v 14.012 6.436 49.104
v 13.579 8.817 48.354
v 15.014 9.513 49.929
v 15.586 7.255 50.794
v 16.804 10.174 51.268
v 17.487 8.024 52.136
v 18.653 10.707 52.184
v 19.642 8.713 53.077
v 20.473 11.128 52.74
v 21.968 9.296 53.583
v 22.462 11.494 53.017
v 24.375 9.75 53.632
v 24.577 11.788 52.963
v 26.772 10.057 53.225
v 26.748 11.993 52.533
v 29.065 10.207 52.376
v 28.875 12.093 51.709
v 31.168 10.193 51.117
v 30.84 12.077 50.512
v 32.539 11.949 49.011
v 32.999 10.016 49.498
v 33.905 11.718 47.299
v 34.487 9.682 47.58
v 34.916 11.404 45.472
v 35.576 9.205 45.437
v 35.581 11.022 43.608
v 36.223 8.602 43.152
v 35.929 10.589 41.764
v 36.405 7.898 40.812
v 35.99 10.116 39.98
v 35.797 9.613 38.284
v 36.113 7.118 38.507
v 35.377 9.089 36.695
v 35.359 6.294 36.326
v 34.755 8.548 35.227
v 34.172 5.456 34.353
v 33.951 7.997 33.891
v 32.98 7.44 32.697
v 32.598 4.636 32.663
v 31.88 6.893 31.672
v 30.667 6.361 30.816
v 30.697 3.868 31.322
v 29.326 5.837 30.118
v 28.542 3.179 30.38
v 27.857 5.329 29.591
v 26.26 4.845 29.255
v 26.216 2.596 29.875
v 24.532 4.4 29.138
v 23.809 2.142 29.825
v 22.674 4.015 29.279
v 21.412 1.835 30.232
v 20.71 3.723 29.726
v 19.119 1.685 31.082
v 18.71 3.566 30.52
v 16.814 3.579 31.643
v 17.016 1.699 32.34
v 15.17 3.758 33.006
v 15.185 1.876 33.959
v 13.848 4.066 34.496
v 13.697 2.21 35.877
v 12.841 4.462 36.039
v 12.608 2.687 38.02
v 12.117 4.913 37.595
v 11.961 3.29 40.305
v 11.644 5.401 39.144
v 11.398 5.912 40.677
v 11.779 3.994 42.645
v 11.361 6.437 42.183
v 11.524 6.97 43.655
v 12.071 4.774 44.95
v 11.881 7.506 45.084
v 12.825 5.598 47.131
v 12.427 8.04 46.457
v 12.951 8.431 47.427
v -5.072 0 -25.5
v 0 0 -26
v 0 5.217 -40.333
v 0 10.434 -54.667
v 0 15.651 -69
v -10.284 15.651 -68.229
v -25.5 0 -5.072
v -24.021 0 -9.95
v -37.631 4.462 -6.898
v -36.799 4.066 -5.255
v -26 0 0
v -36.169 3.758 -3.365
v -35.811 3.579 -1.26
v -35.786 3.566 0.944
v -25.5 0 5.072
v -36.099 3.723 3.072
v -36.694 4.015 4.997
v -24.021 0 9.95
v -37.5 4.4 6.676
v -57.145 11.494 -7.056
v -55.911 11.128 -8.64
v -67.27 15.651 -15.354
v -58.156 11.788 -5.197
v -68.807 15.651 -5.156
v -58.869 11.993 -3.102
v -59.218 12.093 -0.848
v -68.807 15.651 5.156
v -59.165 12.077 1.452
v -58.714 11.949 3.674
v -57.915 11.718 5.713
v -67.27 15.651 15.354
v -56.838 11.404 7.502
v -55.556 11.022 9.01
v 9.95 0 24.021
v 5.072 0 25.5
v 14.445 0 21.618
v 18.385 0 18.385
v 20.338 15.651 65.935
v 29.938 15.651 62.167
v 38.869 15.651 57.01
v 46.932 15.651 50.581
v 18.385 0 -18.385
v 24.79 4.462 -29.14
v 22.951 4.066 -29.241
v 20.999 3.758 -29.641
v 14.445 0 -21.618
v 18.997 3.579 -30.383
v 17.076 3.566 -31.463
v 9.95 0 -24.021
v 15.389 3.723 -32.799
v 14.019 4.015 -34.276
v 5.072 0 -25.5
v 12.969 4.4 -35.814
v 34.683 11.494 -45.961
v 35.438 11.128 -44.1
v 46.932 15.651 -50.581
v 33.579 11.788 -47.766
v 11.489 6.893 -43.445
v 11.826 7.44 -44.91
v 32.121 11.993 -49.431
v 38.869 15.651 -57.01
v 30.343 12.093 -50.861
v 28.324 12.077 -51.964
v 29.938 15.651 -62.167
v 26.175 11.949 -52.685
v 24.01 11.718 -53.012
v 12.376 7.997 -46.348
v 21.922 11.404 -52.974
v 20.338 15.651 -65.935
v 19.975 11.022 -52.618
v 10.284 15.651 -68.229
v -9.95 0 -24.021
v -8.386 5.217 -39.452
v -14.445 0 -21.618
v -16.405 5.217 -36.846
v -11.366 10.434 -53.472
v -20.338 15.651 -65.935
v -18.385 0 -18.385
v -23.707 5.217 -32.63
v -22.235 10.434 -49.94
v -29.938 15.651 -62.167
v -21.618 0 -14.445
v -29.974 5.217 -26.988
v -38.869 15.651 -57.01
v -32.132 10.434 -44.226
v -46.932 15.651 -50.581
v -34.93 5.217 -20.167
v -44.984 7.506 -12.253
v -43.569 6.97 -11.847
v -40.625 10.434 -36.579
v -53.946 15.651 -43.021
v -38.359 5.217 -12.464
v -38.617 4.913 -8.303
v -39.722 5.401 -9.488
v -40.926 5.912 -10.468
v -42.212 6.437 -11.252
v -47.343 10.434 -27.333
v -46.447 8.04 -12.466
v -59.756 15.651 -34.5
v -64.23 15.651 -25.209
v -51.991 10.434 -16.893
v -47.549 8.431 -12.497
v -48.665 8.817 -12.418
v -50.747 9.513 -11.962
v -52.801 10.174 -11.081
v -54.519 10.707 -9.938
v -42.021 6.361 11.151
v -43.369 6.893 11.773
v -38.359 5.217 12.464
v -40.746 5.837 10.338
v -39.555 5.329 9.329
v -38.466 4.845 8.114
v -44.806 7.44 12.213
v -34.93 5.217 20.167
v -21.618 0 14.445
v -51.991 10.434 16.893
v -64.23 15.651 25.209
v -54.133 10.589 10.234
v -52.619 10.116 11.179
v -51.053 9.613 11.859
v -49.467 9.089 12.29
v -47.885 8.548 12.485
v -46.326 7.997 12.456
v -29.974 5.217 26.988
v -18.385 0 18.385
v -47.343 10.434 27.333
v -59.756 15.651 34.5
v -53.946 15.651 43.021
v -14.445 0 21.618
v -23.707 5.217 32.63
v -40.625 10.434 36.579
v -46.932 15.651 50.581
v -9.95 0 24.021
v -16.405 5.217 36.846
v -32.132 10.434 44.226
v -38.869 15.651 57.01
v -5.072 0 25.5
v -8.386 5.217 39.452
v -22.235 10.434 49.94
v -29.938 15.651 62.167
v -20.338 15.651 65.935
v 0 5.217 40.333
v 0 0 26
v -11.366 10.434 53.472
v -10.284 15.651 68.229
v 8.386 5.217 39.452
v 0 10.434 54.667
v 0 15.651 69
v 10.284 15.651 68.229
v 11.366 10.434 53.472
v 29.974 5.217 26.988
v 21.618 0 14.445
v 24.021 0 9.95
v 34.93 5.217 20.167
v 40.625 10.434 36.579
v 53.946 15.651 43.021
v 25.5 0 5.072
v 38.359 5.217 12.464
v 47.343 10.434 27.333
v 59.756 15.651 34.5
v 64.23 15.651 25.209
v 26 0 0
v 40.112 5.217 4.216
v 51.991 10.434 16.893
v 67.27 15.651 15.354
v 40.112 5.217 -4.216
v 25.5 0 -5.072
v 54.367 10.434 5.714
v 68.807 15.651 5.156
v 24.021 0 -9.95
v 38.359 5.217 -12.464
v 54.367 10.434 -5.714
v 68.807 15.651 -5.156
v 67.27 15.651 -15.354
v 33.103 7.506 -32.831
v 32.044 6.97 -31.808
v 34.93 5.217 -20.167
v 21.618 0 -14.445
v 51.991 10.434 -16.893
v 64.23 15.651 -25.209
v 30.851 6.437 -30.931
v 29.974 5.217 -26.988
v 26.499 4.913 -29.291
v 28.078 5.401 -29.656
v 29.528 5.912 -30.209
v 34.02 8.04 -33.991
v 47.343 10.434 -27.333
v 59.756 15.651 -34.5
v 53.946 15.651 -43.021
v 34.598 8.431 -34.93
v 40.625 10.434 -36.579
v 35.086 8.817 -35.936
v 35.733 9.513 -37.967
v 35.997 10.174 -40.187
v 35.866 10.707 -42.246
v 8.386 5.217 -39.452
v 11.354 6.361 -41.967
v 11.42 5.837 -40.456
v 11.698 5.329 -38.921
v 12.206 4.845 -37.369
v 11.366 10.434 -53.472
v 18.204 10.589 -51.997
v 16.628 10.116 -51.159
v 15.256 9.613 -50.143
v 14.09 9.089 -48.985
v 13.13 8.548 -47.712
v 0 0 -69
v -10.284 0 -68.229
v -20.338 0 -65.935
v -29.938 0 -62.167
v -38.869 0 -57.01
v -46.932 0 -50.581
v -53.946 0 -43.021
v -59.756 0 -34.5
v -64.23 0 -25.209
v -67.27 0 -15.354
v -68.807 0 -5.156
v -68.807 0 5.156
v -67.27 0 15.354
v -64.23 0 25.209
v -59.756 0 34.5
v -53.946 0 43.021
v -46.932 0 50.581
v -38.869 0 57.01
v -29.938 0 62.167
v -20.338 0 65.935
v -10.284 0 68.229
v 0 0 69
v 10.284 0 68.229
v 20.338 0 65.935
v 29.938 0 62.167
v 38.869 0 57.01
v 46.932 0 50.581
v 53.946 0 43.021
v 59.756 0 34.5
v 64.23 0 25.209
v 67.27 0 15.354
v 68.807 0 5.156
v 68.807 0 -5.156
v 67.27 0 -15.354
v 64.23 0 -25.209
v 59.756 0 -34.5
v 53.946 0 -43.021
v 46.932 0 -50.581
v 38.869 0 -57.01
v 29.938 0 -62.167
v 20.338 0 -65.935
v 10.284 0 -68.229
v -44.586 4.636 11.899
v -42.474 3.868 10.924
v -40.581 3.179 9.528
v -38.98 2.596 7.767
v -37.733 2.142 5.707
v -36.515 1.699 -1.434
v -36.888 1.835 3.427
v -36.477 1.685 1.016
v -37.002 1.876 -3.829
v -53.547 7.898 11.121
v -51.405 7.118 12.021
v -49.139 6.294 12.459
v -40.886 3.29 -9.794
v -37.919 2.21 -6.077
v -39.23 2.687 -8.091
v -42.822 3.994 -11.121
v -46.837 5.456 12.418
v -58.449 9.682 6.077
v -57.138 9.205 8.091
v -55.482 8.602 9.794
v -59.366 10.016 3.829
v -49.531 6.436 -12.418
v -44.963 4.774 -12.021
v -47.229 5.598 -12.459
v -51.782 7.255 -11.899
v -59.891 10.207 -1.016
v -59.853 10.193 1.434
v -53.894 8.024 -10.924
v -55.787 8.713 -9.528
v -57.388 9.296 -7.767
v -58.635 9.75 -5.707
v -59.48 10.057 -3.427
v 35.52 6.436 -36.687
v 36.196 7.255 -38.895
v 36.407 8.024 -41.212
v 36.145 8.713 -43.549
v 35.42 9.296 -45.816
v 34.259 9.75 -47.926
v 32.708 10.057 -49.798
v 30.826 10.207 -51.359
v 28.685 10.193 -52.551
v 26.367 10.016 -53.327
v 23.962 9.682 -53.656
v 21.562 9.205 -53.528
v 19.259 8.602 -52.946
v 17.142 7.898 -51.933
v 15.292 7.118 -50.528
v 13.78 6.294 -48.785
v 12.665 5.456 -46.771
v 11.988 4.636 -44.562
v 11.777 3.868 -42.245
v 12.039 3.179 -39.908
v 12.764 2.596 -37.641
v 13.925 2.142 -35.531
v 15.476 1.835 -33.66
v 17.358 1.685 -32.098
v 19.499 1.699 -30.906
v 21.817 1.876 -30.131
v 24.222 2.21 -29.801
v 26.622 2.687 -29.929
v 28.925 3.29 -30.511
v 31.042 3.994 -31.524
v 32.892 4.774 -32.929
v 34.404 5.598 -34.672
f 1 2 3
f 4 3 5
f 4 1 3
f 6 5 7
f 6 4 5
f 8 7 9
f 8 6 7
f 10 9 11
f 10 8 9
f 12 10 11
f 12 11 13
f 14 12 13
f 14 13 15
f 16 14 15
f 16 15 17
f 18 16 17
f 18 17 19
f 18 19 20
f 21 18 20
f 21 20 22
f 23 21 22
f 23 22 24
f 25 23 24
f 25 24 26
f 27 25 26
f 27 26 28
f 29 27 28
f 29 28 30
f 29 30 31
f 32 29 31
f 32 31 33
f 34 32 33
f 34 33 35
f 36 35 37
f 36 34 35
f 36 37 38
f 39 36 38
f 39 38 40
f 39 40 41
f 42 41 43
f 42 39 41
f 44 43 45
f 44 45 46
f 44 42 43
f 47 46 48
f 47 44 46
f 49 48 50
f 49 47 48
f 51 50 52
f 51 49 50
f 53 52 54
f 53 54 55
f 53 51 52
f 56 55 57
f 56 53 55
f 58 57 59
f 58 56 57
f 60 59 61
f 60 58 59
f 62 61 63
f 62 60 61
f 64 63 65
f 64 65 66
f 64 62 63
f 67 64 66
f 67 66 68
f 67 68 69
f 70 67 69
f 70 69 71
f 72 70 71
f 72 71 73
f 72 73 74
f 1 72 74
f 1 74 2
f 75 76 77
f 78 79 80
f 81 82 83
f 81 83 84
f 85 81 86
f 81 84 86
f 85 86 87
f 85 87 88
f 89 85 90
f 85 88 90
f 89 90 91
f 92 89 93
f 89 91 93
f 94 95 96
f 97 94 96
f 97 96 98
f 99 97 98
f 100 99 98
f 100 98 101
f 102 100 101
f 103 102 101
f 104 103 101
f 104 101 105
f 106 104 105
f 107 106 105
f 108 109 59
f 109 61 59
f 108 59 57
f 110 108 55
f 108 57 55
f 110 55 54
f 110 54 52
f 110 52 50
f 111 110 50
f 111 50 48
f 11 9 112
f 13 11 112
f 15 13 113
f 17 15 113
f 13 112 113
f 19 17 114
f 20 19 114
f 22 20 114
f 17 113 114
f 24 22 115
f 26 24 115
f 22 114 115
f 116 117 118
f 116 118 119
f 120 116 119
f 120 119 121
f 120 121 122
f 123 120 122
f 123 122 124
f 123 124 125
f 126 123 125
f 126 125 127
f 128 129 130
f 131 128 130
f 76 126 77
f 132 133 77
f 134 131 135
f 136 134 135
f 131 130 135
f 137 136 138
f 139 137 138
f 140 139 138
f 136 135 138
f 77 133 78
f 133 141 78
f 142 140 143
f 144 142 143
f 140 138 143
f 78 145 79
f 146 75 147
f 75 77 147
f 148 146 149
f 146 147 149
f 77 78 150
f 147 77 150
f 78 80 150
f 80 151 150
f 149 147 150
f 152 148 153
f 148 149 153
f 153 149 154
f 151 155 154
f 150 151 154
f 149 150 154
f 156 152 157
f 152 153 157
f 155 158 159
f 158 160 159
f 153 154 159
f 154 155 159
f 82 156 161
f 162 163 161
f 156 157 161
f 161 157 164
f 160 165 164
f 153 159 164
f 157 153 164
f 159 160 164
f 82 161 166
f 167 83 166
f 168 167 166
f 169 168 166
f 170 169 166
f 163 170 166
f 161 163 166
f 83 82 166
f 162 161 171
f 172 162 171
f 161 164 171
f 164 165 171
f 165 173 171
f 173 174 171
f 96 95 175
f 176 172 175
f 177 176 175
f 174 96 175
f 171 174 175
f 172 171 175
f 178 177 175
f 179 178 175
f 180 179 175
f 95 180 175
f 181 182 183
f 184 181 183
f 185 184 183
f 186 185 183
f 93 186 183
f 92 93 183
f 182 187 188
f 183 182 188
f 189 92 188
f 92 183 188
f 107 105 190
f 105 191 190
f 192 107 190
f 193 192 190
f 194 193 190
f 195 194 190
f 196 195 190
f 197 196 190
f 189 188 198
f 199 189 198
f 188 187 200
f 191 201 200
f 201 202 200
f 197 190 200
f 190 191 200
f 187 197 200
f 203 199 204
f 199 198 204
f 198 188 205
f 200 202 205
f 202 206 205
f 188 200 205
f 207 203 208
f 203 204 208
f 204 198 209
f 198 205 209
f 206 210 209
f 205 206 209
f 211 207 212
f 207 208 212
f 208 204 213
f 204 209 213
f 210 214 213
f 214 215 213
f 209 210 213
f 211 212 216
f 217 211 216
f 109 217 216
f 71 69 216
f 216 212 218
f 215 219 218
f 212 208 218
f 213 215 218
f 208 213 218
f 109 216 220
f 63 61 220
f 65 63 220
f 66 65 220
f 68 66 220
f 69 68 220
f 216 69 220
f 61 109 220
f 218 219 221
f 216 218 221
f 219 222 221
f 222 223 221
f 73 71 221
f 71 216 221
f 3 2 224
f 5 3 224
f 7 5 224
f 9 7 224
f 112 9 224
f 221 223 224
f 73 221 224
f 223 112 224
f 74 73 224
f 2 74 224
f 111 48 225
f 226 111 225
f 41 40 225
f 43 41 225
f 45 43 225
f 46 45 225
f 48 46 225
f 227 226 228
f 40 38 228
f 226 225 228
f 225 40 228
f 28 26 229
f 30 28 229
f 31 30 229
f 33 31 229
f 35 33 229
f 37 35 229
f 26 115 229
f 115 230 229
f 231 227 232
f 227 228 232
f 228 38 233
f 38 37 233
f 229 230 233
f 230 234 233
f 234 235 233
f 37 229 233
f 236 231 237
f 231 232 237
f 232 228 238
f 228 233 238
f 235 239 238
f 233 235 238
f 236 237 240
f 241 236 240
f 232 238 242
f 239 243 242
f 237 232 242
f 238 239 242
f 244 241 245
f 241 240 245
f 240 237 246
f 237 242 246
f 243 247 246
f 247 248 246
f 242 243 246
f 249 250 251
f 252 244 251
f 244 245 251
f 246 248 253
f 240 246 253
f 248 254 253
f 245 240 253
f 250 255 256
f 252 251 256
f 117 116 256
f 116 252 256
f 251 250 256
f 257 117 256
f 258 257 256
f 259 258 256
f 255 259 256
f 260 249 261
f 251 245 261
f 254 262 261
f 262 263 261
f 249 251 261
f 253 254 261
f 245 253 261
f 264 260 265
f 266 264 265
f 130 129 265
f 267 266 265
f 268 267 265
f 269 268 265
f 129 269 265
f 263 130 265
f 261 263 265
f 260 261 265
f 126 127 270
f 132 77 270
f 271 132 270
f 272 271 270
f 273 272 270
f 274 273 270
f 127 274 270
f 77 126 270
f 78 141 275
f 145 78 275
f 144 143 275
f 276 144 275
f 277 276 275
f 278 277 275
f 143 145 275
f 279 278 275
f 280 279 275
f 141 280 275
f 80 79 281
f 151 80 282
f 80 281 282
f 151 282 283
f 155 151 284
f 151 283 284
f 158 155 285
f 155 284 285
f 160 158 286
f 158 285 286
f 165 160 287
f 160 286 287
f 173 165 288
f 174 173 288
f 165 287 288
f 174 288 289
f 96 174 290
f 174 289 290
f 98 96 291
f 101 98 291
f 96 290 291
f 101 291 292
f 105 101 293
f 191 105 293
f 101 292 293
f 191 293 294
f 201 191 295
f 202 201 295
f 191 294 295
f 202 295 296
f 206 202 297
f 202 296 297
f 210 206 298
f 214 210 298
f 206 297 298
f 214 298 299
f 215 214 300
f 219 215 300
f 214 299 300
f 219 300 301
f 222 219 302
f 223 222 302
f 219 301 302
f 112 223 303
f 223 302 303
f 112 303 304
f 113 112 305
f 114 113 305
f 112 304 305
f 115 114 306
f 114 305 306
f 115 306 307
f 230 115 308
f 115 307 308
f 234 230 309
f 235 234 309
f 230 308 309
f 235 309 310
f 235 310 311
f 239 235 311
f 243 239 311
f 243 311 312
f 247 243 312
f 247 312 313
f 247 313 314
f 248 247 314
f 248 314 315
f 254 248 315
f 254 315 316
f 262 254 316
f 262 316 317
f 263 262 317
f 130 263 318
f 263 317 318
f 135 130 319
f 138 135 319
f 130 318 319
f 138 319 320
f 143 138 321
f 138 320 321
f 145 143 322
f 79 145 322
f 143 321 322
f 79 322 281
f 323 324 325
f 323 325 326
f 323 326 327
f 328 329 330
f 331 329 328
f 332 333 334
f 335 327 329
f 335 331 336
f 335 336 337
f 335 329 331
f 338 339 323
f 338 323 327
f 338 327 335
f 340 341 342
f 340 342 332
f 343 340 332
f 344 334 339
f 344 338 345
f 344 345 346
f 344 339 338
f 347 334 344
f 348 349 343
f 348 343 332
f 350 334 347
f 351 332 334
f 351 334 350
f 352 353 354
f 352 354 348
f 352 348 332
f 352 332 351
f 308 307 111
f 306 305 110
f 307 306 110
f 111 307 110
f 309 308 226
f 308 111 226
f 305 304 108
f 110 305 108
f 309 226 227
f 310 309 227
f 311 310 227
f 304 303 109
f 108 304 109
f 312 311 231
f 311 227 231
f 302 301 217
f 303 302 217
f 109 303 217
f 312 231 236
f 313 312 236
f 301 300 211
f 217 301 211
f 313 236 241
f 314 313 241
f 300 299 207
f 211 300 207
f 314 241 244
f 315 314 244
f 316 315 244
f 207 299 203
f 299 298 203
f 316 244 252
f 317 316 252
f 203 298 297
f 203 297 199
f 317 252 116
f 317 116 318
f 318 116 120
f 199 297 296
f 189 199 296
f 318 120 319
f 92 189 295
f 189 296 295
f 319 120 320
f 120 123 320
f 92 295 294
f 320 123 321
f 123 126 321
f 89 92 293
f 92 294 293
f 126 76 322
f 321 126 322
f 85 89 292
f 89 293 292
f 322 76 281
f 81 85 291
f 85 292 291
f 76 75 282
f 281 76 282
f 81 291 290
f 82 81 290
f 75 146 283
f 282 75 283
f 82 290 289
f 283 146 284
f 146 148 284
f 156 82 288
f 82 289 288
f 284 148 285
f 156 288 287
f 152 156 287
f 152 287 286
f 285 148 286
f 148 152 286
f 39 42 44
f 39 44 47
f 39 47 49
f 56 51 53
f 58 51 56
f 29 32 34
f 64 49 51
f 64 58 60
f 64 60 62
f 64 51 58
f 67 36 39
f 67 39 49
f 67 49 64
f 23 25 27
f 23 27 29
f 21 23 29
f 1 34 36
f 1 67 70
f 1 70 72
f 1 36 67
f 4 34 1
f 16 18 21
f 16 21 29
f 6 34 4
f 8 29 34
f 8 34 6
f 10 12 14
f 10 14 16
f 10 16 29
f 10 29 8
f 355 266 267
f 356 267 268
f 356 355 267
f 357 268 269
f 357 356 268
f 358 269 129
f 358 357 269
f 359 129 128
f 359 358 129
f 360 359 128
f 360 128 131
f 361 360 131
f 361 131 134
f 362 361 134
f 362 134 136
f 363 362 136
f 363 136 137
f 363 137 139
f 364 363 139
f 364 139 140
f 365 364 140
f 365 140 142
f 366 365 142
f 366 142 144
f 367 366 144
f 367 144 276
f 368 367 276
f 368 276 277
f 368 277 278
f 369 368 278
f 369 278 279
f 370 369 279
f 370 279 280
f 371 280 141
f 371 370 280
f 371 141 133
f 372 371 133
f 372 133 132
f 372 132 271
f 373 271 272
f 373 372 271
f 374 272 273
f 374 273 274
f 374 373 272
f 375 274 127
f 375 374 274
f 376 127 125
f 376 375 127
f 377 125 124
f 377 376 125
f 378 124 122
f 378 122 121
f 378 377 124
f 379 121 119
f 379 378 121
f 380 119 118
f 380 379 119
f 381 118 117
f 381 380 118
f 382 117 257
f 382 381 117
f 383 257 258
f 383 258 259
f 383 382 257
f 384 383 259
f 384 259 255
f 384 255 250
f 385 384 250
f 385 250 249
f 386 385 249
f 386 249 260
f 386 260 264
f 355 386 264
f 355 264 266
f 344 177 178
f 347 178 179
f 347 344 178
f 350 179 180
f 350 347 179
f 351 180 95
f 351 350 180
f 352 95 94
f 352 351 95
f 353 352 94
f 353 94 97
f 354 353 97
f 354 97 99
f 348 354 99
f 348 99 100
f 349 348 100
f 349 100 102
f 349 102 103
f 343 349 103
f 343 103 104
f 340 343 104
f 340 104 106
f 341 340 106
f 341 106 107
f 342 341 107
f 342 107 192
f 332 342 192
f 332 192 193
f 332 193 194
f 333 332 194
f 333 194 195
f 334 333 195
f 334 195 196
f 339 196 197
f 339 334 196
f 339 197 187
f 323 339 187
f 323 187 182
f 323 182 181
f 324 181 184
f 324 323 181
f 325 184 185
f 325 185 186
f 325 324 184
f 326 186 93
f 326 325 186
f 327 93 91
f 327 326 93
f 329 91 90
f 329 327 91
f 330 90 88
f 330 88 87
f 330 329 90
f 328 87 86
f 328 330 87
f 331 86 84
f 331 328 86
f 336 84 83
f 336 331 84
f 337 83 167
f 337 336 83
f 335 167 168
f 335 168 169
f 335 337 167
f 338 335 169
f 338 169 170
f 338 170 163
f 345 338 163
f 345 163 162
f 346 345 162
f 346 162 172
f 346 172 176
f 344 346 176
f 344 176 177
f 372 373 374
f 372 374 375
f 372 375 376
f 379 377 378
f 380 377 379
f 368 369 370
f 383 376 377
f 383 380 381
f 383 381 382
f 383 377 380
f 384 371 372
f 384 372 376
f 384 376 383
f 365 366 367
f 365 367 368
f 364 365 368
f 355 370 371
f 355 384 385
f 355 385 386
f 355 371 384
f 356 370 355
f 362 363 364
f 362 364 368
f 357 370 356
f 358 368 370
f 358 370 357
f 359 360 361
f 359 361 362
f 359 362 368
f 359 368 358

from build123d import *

# Parameters (mm, degrees)
TAGLIO_ESTRUSIONE5_START    = -2
SCHIZZO2_R                  = 12.5
TAGLIO_ESTRUSIONE5_DEPTH    = 12
RIPETIZIONECIRCOLARE1_COUNT = 3


with BuildPart() as part:
    # Schizzo1 → Rivoluzione1 (revolve)
    with BuildSketch(Plane.XY, mode=Mode.PRIVATE) as rivoluzione1_sk:
        Polygon((-69, 15.650720073), (-69, 0), (-26, 0), align=None)
    revolve(rivoluzione1_sk.sketch.rotate(Axis((0, 0, 0), (0, 1, 0)), 270), axis=Axis((0, 0, 0), (0, 1, 0)))

    # Schizzo2 → Taglio-Estrusione5 (cut)
    with BuildSketch(Plane(origin=(-3.041422239, -8.356238926, 6.34e-07), x_dir=(-0.9396926207859105, 0.3420201433256629, 0), z_dir=(0.34202014332566205, 0.9396926207859082, -7.133604585251575e-08)).offset(TAGLIO_ESTRUSIONE5_START)):
        with Locations(Location((47.311830249, -6.33e-07, 0), (0, 0, 276.586310477))):
            Circle(SCHIZZO2_R)
    taglio_estrusione5 = extrude(amount=TAGLIO_ESTRUSIONE5_DEPTH, mode=Mode.SUBTRACT)

    # RipetizioneCircolare1: Taglio-Estrusione5 ×3 about axis
    ripetizionecircolare1_axis = Axis((0, 0, 0), (0, 1, 0))
    for i in range(1, RIPETIZIONECIRCOLARE1_COUNT):
        add(taglio_estrusione5.rotate(ripetizionecircolare1_axis, i * 360 / RIPETIZIONECIRCOLARE1_COUNT), mode=Mode.SUBTRACT)


solid = part.part
